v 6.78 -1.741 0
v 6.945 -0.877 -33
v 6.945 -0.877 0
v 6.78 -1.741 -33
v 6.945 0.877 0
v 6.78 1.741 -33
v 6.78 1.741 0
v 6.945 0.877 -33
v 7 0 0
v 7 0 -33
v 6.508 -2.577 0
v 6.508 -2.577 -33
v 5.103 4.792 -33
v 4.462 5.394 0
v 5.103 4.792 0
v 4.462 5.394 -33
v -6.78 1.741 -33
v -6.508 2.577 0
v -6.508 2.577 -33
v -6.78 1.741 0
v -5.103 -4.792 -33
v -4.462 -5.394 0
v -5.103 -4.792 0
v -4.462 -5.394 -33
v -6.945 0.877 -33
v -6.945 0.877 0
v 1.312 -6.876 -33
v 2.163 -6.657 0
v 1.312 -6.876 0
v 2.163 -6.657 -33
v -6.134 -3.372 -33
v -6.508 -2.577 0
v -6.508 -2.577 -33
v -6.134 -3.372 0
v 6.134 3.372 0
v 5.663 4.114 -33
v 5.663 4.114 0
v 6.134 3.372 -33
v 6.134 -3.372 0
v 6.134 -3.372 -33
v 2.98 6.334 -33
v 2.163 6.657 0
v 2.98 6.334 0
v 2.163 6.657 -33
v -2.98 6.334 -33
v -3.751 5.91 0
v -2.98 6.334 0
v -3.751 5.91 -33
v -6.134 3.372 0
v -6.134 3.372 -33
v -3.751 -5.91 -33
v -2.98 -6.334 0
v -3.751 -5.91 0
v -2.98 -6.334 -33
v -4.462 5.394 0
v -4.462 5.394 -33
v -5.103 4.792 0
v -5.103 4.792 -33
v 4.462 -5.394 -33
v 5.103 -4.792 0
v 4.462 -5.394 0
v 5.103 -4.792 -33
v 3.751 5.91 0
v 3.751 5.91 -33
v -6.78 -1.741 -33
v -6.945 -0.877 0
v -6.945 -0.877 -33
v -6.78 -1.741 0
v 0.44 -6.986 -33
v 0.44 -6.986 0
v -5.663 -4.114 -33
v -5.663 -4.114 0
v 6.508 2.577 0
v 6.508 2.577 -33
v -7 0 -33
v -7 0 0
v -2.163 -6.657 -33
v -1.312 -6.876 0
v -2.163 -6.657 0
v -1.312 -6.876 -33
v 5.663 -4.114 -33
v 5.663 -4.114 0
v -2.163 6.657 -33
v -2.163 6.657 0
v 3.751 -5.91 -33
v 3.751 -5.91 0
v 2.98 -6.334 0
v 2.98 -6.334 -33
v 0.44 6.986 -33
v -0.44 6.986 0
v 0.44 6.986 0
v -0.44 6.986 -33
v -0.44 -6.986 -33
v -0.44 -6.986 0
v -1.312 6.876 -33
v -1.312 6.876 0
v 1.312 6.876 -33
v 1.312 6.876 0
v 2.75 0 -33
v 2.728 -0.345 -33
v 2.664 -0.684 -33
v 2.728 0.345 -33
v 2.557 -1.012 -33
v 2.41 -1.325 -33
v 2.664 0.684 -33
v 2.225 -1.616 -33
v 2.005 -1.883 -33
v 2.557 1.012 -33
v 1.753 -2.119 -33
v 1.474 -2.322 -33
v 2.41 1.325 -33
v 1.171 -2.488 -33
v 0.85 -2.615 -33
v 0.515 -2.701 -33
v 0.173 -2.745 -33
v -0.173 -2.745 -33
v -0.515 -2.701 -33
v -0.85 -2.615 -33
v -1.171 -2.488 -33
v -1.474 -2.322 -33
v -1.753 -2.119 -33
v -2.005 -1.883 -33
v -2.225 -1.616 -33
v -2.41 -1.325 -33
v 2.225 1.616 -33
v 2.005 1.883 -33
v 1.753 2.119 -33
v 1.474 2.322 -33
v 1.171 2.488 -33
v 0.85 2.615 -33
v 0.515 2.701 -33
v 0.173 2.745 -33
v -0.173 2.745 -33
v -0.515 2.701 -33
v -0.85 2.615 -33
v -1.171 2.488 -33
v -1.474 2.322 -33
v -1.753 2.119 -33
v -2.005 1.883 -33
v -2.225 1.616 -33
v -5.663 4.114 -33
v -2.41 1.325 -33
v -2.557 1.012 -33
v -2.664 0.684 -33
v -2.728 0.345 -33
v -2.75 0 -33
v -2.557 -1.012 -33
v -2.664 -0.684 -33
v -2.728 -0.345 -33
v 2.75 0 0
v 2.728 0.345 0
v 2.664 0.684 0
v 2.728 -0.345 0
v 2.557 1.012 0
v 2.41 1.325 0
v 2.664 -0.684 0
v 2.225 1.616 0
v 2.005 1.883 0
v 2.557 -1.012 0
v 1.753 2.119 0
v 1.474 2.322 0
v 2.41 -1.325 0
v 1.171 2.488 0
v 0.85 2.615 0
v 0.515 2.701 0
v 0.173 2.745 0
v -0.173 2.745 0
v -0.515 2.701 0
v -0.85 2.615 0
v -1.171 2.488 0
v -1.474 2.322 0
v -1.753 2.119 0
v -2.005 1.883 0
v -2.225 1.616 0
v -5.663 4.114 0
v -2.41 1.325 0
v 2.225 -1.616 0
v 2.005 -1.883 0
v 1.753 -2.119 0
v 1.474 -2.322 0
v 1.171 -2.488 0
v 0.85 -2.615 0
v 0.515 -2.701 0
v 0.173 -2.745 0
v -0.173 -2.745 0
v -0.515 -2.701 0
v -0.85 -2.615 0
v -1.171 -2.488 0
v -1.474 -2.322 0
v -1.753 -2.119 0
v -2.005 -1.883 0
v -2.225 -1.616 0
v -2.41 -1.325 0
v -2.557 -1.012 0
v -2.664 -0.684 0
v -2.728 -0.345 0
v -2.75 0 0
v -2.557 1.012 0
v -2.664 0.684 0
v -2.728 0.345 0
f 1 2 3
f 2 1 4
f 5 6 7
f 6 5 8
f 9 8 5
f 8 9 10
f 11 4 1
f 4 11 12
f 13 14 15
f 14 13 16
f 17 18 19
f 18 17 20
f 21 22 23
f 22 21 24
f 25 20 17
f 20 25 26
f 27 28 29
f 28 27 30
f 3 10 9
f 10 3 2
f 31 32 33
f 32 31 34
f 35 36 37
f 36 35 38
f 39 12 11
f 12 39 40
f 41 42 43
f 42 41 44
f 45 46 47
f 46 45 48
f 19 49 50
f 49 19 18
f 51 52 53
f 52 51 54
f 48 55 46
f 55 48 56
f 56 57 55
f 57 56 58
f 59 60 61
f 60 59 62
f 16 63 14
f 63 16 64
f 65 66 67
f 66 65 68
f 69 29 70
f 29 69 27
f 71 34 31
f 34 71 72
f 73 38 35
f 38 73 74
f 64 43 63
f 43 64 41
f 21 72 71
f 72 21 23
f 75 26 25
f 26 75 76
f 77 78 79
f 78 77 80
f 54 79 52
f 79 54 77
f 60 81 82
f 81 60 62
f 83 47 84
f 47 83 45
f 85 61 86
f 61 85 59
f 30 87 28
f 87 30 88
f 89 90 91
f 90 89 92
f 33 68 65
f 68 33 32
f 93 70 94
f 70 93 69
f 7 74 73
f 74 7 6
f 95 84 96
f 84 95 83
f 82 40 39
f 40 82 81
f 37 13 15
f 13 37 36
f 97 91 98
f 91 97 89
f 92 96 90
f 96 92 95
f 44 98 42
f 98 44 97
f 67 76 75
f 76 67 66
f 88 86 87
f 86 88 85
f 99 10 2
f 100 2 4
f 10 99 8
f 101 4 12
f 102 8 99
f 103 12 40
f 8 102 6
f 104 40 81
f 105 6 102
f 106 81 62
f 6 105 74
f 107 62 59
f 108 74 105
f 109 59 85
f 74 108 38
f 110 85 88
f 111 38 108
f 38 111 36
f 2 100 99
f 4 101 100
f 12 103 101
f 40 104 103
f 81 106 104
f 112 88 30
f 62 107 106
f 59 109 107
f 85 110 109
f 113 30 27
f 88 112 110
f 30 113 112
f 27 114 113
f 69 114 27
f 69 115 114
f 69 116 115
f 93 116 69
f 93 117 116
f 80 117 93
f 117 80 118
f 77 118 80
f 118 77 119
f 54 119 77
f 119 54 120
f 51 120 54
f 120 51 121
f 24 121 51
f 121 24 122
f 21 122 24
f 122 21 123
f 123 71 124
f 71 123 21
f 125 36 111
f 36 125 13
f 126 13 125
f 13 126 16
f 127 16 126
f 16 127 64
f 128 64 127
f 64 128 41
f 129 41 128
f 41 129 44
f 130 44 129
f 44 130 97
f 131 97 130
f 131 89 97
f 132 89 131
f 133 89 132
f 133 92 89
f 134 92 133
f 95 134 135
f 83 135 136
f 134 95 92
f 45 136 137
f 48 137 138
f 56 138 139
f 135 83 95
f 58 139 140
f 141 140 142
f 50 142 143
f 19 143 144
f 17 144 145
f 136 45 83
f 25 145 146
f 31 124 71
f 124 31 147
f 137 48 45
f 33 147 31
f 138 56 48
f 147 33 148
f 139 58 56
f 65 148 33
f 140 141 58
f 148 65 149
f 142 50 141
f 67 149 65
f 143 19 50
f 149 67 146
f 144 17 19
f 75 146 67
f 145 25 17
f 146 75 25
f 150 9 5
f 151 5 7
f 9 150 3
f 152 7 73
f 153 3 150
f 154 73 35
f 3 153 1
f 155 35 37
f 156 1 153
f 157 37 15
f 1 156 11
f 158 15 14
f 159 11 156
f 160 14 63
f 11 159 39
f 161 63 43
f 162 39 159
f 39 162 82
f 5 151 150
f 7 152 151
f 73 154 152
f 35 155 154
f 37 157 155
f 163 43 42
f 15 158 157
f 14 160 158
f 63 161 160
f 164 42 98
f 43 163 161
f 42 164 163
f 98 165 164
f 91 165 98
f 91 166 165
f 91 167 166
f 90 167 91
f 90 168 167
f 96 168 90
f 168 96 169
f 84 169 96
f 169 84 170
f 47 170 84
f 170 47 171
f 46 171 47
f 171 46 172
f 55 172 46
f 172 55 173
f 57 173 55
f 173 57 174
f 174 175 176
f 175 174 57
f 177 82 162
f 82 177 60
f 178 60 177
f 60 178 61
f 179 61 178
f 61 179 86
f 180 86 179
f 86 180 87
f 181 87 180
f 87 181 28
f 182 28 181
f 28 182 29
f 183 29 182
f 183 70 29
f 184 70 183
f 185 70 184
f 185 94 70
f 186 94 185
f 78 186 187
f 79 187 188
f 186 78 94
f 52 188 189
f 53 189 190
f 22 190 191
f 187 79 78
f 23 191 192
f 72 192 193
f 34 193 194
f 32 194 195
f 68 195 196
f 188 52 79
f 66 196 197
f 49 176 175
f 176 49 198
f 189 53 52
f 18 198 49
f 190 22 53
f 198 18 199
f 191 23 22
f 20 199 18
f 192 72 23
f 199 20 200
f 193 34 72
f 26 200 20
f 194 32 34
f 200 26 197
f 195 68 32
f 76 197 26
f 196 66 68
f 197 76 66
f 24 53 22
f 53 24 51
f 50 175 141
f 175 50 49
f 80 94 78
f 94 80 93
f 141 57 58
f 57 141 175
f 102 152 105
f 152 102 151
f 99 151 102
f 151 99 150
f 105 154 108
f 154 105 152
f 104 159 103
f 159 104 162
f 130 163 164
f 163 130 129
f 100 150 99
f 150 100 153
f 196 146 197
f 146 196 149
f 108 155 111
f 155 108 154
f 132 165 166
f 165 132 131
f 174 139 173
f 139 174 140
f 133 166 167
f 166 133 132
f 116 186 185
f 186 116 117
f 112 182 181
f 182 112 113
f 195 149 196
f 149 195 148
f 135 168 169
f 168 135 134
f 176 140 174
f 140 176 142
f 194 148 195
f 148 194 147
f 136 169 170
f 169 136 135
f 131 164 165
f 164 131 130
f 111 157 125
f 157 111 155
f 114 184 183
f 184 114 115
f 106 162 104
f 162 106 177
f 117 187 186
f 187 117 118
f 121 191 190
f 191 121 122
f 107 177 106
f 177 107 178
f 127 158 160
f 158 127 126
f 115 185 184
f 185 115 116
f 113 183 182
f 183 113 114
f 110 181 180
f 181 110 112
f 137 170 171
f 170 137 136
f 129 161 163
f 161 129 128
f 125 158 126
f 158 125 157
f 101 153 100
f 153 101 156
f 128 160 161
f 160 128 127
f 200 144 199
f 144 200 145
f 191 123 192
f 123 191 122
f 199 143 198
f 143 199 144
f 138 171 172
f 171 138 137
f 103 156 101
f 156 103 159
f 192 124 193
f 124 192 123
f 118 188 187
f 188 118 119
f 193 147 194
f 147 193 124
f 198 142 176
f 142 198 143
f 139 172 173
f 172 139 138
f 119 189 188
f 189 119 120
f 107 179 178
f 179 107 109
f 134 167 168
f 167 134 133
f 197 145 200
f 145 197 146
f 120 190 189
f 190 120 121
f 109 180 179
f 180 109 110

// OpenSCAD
$fn = 50;


difference() {
	union() {
		translate(v = [0, 0, -33.0000000000]) {
			cylinder(h = 33, r = 7.0000000000);
		}
	}
	union() {
		#translate(v = [0, 0, -33]) {
			cylinder(h = 33, r = 2.7500000000);
		}
	}
}
